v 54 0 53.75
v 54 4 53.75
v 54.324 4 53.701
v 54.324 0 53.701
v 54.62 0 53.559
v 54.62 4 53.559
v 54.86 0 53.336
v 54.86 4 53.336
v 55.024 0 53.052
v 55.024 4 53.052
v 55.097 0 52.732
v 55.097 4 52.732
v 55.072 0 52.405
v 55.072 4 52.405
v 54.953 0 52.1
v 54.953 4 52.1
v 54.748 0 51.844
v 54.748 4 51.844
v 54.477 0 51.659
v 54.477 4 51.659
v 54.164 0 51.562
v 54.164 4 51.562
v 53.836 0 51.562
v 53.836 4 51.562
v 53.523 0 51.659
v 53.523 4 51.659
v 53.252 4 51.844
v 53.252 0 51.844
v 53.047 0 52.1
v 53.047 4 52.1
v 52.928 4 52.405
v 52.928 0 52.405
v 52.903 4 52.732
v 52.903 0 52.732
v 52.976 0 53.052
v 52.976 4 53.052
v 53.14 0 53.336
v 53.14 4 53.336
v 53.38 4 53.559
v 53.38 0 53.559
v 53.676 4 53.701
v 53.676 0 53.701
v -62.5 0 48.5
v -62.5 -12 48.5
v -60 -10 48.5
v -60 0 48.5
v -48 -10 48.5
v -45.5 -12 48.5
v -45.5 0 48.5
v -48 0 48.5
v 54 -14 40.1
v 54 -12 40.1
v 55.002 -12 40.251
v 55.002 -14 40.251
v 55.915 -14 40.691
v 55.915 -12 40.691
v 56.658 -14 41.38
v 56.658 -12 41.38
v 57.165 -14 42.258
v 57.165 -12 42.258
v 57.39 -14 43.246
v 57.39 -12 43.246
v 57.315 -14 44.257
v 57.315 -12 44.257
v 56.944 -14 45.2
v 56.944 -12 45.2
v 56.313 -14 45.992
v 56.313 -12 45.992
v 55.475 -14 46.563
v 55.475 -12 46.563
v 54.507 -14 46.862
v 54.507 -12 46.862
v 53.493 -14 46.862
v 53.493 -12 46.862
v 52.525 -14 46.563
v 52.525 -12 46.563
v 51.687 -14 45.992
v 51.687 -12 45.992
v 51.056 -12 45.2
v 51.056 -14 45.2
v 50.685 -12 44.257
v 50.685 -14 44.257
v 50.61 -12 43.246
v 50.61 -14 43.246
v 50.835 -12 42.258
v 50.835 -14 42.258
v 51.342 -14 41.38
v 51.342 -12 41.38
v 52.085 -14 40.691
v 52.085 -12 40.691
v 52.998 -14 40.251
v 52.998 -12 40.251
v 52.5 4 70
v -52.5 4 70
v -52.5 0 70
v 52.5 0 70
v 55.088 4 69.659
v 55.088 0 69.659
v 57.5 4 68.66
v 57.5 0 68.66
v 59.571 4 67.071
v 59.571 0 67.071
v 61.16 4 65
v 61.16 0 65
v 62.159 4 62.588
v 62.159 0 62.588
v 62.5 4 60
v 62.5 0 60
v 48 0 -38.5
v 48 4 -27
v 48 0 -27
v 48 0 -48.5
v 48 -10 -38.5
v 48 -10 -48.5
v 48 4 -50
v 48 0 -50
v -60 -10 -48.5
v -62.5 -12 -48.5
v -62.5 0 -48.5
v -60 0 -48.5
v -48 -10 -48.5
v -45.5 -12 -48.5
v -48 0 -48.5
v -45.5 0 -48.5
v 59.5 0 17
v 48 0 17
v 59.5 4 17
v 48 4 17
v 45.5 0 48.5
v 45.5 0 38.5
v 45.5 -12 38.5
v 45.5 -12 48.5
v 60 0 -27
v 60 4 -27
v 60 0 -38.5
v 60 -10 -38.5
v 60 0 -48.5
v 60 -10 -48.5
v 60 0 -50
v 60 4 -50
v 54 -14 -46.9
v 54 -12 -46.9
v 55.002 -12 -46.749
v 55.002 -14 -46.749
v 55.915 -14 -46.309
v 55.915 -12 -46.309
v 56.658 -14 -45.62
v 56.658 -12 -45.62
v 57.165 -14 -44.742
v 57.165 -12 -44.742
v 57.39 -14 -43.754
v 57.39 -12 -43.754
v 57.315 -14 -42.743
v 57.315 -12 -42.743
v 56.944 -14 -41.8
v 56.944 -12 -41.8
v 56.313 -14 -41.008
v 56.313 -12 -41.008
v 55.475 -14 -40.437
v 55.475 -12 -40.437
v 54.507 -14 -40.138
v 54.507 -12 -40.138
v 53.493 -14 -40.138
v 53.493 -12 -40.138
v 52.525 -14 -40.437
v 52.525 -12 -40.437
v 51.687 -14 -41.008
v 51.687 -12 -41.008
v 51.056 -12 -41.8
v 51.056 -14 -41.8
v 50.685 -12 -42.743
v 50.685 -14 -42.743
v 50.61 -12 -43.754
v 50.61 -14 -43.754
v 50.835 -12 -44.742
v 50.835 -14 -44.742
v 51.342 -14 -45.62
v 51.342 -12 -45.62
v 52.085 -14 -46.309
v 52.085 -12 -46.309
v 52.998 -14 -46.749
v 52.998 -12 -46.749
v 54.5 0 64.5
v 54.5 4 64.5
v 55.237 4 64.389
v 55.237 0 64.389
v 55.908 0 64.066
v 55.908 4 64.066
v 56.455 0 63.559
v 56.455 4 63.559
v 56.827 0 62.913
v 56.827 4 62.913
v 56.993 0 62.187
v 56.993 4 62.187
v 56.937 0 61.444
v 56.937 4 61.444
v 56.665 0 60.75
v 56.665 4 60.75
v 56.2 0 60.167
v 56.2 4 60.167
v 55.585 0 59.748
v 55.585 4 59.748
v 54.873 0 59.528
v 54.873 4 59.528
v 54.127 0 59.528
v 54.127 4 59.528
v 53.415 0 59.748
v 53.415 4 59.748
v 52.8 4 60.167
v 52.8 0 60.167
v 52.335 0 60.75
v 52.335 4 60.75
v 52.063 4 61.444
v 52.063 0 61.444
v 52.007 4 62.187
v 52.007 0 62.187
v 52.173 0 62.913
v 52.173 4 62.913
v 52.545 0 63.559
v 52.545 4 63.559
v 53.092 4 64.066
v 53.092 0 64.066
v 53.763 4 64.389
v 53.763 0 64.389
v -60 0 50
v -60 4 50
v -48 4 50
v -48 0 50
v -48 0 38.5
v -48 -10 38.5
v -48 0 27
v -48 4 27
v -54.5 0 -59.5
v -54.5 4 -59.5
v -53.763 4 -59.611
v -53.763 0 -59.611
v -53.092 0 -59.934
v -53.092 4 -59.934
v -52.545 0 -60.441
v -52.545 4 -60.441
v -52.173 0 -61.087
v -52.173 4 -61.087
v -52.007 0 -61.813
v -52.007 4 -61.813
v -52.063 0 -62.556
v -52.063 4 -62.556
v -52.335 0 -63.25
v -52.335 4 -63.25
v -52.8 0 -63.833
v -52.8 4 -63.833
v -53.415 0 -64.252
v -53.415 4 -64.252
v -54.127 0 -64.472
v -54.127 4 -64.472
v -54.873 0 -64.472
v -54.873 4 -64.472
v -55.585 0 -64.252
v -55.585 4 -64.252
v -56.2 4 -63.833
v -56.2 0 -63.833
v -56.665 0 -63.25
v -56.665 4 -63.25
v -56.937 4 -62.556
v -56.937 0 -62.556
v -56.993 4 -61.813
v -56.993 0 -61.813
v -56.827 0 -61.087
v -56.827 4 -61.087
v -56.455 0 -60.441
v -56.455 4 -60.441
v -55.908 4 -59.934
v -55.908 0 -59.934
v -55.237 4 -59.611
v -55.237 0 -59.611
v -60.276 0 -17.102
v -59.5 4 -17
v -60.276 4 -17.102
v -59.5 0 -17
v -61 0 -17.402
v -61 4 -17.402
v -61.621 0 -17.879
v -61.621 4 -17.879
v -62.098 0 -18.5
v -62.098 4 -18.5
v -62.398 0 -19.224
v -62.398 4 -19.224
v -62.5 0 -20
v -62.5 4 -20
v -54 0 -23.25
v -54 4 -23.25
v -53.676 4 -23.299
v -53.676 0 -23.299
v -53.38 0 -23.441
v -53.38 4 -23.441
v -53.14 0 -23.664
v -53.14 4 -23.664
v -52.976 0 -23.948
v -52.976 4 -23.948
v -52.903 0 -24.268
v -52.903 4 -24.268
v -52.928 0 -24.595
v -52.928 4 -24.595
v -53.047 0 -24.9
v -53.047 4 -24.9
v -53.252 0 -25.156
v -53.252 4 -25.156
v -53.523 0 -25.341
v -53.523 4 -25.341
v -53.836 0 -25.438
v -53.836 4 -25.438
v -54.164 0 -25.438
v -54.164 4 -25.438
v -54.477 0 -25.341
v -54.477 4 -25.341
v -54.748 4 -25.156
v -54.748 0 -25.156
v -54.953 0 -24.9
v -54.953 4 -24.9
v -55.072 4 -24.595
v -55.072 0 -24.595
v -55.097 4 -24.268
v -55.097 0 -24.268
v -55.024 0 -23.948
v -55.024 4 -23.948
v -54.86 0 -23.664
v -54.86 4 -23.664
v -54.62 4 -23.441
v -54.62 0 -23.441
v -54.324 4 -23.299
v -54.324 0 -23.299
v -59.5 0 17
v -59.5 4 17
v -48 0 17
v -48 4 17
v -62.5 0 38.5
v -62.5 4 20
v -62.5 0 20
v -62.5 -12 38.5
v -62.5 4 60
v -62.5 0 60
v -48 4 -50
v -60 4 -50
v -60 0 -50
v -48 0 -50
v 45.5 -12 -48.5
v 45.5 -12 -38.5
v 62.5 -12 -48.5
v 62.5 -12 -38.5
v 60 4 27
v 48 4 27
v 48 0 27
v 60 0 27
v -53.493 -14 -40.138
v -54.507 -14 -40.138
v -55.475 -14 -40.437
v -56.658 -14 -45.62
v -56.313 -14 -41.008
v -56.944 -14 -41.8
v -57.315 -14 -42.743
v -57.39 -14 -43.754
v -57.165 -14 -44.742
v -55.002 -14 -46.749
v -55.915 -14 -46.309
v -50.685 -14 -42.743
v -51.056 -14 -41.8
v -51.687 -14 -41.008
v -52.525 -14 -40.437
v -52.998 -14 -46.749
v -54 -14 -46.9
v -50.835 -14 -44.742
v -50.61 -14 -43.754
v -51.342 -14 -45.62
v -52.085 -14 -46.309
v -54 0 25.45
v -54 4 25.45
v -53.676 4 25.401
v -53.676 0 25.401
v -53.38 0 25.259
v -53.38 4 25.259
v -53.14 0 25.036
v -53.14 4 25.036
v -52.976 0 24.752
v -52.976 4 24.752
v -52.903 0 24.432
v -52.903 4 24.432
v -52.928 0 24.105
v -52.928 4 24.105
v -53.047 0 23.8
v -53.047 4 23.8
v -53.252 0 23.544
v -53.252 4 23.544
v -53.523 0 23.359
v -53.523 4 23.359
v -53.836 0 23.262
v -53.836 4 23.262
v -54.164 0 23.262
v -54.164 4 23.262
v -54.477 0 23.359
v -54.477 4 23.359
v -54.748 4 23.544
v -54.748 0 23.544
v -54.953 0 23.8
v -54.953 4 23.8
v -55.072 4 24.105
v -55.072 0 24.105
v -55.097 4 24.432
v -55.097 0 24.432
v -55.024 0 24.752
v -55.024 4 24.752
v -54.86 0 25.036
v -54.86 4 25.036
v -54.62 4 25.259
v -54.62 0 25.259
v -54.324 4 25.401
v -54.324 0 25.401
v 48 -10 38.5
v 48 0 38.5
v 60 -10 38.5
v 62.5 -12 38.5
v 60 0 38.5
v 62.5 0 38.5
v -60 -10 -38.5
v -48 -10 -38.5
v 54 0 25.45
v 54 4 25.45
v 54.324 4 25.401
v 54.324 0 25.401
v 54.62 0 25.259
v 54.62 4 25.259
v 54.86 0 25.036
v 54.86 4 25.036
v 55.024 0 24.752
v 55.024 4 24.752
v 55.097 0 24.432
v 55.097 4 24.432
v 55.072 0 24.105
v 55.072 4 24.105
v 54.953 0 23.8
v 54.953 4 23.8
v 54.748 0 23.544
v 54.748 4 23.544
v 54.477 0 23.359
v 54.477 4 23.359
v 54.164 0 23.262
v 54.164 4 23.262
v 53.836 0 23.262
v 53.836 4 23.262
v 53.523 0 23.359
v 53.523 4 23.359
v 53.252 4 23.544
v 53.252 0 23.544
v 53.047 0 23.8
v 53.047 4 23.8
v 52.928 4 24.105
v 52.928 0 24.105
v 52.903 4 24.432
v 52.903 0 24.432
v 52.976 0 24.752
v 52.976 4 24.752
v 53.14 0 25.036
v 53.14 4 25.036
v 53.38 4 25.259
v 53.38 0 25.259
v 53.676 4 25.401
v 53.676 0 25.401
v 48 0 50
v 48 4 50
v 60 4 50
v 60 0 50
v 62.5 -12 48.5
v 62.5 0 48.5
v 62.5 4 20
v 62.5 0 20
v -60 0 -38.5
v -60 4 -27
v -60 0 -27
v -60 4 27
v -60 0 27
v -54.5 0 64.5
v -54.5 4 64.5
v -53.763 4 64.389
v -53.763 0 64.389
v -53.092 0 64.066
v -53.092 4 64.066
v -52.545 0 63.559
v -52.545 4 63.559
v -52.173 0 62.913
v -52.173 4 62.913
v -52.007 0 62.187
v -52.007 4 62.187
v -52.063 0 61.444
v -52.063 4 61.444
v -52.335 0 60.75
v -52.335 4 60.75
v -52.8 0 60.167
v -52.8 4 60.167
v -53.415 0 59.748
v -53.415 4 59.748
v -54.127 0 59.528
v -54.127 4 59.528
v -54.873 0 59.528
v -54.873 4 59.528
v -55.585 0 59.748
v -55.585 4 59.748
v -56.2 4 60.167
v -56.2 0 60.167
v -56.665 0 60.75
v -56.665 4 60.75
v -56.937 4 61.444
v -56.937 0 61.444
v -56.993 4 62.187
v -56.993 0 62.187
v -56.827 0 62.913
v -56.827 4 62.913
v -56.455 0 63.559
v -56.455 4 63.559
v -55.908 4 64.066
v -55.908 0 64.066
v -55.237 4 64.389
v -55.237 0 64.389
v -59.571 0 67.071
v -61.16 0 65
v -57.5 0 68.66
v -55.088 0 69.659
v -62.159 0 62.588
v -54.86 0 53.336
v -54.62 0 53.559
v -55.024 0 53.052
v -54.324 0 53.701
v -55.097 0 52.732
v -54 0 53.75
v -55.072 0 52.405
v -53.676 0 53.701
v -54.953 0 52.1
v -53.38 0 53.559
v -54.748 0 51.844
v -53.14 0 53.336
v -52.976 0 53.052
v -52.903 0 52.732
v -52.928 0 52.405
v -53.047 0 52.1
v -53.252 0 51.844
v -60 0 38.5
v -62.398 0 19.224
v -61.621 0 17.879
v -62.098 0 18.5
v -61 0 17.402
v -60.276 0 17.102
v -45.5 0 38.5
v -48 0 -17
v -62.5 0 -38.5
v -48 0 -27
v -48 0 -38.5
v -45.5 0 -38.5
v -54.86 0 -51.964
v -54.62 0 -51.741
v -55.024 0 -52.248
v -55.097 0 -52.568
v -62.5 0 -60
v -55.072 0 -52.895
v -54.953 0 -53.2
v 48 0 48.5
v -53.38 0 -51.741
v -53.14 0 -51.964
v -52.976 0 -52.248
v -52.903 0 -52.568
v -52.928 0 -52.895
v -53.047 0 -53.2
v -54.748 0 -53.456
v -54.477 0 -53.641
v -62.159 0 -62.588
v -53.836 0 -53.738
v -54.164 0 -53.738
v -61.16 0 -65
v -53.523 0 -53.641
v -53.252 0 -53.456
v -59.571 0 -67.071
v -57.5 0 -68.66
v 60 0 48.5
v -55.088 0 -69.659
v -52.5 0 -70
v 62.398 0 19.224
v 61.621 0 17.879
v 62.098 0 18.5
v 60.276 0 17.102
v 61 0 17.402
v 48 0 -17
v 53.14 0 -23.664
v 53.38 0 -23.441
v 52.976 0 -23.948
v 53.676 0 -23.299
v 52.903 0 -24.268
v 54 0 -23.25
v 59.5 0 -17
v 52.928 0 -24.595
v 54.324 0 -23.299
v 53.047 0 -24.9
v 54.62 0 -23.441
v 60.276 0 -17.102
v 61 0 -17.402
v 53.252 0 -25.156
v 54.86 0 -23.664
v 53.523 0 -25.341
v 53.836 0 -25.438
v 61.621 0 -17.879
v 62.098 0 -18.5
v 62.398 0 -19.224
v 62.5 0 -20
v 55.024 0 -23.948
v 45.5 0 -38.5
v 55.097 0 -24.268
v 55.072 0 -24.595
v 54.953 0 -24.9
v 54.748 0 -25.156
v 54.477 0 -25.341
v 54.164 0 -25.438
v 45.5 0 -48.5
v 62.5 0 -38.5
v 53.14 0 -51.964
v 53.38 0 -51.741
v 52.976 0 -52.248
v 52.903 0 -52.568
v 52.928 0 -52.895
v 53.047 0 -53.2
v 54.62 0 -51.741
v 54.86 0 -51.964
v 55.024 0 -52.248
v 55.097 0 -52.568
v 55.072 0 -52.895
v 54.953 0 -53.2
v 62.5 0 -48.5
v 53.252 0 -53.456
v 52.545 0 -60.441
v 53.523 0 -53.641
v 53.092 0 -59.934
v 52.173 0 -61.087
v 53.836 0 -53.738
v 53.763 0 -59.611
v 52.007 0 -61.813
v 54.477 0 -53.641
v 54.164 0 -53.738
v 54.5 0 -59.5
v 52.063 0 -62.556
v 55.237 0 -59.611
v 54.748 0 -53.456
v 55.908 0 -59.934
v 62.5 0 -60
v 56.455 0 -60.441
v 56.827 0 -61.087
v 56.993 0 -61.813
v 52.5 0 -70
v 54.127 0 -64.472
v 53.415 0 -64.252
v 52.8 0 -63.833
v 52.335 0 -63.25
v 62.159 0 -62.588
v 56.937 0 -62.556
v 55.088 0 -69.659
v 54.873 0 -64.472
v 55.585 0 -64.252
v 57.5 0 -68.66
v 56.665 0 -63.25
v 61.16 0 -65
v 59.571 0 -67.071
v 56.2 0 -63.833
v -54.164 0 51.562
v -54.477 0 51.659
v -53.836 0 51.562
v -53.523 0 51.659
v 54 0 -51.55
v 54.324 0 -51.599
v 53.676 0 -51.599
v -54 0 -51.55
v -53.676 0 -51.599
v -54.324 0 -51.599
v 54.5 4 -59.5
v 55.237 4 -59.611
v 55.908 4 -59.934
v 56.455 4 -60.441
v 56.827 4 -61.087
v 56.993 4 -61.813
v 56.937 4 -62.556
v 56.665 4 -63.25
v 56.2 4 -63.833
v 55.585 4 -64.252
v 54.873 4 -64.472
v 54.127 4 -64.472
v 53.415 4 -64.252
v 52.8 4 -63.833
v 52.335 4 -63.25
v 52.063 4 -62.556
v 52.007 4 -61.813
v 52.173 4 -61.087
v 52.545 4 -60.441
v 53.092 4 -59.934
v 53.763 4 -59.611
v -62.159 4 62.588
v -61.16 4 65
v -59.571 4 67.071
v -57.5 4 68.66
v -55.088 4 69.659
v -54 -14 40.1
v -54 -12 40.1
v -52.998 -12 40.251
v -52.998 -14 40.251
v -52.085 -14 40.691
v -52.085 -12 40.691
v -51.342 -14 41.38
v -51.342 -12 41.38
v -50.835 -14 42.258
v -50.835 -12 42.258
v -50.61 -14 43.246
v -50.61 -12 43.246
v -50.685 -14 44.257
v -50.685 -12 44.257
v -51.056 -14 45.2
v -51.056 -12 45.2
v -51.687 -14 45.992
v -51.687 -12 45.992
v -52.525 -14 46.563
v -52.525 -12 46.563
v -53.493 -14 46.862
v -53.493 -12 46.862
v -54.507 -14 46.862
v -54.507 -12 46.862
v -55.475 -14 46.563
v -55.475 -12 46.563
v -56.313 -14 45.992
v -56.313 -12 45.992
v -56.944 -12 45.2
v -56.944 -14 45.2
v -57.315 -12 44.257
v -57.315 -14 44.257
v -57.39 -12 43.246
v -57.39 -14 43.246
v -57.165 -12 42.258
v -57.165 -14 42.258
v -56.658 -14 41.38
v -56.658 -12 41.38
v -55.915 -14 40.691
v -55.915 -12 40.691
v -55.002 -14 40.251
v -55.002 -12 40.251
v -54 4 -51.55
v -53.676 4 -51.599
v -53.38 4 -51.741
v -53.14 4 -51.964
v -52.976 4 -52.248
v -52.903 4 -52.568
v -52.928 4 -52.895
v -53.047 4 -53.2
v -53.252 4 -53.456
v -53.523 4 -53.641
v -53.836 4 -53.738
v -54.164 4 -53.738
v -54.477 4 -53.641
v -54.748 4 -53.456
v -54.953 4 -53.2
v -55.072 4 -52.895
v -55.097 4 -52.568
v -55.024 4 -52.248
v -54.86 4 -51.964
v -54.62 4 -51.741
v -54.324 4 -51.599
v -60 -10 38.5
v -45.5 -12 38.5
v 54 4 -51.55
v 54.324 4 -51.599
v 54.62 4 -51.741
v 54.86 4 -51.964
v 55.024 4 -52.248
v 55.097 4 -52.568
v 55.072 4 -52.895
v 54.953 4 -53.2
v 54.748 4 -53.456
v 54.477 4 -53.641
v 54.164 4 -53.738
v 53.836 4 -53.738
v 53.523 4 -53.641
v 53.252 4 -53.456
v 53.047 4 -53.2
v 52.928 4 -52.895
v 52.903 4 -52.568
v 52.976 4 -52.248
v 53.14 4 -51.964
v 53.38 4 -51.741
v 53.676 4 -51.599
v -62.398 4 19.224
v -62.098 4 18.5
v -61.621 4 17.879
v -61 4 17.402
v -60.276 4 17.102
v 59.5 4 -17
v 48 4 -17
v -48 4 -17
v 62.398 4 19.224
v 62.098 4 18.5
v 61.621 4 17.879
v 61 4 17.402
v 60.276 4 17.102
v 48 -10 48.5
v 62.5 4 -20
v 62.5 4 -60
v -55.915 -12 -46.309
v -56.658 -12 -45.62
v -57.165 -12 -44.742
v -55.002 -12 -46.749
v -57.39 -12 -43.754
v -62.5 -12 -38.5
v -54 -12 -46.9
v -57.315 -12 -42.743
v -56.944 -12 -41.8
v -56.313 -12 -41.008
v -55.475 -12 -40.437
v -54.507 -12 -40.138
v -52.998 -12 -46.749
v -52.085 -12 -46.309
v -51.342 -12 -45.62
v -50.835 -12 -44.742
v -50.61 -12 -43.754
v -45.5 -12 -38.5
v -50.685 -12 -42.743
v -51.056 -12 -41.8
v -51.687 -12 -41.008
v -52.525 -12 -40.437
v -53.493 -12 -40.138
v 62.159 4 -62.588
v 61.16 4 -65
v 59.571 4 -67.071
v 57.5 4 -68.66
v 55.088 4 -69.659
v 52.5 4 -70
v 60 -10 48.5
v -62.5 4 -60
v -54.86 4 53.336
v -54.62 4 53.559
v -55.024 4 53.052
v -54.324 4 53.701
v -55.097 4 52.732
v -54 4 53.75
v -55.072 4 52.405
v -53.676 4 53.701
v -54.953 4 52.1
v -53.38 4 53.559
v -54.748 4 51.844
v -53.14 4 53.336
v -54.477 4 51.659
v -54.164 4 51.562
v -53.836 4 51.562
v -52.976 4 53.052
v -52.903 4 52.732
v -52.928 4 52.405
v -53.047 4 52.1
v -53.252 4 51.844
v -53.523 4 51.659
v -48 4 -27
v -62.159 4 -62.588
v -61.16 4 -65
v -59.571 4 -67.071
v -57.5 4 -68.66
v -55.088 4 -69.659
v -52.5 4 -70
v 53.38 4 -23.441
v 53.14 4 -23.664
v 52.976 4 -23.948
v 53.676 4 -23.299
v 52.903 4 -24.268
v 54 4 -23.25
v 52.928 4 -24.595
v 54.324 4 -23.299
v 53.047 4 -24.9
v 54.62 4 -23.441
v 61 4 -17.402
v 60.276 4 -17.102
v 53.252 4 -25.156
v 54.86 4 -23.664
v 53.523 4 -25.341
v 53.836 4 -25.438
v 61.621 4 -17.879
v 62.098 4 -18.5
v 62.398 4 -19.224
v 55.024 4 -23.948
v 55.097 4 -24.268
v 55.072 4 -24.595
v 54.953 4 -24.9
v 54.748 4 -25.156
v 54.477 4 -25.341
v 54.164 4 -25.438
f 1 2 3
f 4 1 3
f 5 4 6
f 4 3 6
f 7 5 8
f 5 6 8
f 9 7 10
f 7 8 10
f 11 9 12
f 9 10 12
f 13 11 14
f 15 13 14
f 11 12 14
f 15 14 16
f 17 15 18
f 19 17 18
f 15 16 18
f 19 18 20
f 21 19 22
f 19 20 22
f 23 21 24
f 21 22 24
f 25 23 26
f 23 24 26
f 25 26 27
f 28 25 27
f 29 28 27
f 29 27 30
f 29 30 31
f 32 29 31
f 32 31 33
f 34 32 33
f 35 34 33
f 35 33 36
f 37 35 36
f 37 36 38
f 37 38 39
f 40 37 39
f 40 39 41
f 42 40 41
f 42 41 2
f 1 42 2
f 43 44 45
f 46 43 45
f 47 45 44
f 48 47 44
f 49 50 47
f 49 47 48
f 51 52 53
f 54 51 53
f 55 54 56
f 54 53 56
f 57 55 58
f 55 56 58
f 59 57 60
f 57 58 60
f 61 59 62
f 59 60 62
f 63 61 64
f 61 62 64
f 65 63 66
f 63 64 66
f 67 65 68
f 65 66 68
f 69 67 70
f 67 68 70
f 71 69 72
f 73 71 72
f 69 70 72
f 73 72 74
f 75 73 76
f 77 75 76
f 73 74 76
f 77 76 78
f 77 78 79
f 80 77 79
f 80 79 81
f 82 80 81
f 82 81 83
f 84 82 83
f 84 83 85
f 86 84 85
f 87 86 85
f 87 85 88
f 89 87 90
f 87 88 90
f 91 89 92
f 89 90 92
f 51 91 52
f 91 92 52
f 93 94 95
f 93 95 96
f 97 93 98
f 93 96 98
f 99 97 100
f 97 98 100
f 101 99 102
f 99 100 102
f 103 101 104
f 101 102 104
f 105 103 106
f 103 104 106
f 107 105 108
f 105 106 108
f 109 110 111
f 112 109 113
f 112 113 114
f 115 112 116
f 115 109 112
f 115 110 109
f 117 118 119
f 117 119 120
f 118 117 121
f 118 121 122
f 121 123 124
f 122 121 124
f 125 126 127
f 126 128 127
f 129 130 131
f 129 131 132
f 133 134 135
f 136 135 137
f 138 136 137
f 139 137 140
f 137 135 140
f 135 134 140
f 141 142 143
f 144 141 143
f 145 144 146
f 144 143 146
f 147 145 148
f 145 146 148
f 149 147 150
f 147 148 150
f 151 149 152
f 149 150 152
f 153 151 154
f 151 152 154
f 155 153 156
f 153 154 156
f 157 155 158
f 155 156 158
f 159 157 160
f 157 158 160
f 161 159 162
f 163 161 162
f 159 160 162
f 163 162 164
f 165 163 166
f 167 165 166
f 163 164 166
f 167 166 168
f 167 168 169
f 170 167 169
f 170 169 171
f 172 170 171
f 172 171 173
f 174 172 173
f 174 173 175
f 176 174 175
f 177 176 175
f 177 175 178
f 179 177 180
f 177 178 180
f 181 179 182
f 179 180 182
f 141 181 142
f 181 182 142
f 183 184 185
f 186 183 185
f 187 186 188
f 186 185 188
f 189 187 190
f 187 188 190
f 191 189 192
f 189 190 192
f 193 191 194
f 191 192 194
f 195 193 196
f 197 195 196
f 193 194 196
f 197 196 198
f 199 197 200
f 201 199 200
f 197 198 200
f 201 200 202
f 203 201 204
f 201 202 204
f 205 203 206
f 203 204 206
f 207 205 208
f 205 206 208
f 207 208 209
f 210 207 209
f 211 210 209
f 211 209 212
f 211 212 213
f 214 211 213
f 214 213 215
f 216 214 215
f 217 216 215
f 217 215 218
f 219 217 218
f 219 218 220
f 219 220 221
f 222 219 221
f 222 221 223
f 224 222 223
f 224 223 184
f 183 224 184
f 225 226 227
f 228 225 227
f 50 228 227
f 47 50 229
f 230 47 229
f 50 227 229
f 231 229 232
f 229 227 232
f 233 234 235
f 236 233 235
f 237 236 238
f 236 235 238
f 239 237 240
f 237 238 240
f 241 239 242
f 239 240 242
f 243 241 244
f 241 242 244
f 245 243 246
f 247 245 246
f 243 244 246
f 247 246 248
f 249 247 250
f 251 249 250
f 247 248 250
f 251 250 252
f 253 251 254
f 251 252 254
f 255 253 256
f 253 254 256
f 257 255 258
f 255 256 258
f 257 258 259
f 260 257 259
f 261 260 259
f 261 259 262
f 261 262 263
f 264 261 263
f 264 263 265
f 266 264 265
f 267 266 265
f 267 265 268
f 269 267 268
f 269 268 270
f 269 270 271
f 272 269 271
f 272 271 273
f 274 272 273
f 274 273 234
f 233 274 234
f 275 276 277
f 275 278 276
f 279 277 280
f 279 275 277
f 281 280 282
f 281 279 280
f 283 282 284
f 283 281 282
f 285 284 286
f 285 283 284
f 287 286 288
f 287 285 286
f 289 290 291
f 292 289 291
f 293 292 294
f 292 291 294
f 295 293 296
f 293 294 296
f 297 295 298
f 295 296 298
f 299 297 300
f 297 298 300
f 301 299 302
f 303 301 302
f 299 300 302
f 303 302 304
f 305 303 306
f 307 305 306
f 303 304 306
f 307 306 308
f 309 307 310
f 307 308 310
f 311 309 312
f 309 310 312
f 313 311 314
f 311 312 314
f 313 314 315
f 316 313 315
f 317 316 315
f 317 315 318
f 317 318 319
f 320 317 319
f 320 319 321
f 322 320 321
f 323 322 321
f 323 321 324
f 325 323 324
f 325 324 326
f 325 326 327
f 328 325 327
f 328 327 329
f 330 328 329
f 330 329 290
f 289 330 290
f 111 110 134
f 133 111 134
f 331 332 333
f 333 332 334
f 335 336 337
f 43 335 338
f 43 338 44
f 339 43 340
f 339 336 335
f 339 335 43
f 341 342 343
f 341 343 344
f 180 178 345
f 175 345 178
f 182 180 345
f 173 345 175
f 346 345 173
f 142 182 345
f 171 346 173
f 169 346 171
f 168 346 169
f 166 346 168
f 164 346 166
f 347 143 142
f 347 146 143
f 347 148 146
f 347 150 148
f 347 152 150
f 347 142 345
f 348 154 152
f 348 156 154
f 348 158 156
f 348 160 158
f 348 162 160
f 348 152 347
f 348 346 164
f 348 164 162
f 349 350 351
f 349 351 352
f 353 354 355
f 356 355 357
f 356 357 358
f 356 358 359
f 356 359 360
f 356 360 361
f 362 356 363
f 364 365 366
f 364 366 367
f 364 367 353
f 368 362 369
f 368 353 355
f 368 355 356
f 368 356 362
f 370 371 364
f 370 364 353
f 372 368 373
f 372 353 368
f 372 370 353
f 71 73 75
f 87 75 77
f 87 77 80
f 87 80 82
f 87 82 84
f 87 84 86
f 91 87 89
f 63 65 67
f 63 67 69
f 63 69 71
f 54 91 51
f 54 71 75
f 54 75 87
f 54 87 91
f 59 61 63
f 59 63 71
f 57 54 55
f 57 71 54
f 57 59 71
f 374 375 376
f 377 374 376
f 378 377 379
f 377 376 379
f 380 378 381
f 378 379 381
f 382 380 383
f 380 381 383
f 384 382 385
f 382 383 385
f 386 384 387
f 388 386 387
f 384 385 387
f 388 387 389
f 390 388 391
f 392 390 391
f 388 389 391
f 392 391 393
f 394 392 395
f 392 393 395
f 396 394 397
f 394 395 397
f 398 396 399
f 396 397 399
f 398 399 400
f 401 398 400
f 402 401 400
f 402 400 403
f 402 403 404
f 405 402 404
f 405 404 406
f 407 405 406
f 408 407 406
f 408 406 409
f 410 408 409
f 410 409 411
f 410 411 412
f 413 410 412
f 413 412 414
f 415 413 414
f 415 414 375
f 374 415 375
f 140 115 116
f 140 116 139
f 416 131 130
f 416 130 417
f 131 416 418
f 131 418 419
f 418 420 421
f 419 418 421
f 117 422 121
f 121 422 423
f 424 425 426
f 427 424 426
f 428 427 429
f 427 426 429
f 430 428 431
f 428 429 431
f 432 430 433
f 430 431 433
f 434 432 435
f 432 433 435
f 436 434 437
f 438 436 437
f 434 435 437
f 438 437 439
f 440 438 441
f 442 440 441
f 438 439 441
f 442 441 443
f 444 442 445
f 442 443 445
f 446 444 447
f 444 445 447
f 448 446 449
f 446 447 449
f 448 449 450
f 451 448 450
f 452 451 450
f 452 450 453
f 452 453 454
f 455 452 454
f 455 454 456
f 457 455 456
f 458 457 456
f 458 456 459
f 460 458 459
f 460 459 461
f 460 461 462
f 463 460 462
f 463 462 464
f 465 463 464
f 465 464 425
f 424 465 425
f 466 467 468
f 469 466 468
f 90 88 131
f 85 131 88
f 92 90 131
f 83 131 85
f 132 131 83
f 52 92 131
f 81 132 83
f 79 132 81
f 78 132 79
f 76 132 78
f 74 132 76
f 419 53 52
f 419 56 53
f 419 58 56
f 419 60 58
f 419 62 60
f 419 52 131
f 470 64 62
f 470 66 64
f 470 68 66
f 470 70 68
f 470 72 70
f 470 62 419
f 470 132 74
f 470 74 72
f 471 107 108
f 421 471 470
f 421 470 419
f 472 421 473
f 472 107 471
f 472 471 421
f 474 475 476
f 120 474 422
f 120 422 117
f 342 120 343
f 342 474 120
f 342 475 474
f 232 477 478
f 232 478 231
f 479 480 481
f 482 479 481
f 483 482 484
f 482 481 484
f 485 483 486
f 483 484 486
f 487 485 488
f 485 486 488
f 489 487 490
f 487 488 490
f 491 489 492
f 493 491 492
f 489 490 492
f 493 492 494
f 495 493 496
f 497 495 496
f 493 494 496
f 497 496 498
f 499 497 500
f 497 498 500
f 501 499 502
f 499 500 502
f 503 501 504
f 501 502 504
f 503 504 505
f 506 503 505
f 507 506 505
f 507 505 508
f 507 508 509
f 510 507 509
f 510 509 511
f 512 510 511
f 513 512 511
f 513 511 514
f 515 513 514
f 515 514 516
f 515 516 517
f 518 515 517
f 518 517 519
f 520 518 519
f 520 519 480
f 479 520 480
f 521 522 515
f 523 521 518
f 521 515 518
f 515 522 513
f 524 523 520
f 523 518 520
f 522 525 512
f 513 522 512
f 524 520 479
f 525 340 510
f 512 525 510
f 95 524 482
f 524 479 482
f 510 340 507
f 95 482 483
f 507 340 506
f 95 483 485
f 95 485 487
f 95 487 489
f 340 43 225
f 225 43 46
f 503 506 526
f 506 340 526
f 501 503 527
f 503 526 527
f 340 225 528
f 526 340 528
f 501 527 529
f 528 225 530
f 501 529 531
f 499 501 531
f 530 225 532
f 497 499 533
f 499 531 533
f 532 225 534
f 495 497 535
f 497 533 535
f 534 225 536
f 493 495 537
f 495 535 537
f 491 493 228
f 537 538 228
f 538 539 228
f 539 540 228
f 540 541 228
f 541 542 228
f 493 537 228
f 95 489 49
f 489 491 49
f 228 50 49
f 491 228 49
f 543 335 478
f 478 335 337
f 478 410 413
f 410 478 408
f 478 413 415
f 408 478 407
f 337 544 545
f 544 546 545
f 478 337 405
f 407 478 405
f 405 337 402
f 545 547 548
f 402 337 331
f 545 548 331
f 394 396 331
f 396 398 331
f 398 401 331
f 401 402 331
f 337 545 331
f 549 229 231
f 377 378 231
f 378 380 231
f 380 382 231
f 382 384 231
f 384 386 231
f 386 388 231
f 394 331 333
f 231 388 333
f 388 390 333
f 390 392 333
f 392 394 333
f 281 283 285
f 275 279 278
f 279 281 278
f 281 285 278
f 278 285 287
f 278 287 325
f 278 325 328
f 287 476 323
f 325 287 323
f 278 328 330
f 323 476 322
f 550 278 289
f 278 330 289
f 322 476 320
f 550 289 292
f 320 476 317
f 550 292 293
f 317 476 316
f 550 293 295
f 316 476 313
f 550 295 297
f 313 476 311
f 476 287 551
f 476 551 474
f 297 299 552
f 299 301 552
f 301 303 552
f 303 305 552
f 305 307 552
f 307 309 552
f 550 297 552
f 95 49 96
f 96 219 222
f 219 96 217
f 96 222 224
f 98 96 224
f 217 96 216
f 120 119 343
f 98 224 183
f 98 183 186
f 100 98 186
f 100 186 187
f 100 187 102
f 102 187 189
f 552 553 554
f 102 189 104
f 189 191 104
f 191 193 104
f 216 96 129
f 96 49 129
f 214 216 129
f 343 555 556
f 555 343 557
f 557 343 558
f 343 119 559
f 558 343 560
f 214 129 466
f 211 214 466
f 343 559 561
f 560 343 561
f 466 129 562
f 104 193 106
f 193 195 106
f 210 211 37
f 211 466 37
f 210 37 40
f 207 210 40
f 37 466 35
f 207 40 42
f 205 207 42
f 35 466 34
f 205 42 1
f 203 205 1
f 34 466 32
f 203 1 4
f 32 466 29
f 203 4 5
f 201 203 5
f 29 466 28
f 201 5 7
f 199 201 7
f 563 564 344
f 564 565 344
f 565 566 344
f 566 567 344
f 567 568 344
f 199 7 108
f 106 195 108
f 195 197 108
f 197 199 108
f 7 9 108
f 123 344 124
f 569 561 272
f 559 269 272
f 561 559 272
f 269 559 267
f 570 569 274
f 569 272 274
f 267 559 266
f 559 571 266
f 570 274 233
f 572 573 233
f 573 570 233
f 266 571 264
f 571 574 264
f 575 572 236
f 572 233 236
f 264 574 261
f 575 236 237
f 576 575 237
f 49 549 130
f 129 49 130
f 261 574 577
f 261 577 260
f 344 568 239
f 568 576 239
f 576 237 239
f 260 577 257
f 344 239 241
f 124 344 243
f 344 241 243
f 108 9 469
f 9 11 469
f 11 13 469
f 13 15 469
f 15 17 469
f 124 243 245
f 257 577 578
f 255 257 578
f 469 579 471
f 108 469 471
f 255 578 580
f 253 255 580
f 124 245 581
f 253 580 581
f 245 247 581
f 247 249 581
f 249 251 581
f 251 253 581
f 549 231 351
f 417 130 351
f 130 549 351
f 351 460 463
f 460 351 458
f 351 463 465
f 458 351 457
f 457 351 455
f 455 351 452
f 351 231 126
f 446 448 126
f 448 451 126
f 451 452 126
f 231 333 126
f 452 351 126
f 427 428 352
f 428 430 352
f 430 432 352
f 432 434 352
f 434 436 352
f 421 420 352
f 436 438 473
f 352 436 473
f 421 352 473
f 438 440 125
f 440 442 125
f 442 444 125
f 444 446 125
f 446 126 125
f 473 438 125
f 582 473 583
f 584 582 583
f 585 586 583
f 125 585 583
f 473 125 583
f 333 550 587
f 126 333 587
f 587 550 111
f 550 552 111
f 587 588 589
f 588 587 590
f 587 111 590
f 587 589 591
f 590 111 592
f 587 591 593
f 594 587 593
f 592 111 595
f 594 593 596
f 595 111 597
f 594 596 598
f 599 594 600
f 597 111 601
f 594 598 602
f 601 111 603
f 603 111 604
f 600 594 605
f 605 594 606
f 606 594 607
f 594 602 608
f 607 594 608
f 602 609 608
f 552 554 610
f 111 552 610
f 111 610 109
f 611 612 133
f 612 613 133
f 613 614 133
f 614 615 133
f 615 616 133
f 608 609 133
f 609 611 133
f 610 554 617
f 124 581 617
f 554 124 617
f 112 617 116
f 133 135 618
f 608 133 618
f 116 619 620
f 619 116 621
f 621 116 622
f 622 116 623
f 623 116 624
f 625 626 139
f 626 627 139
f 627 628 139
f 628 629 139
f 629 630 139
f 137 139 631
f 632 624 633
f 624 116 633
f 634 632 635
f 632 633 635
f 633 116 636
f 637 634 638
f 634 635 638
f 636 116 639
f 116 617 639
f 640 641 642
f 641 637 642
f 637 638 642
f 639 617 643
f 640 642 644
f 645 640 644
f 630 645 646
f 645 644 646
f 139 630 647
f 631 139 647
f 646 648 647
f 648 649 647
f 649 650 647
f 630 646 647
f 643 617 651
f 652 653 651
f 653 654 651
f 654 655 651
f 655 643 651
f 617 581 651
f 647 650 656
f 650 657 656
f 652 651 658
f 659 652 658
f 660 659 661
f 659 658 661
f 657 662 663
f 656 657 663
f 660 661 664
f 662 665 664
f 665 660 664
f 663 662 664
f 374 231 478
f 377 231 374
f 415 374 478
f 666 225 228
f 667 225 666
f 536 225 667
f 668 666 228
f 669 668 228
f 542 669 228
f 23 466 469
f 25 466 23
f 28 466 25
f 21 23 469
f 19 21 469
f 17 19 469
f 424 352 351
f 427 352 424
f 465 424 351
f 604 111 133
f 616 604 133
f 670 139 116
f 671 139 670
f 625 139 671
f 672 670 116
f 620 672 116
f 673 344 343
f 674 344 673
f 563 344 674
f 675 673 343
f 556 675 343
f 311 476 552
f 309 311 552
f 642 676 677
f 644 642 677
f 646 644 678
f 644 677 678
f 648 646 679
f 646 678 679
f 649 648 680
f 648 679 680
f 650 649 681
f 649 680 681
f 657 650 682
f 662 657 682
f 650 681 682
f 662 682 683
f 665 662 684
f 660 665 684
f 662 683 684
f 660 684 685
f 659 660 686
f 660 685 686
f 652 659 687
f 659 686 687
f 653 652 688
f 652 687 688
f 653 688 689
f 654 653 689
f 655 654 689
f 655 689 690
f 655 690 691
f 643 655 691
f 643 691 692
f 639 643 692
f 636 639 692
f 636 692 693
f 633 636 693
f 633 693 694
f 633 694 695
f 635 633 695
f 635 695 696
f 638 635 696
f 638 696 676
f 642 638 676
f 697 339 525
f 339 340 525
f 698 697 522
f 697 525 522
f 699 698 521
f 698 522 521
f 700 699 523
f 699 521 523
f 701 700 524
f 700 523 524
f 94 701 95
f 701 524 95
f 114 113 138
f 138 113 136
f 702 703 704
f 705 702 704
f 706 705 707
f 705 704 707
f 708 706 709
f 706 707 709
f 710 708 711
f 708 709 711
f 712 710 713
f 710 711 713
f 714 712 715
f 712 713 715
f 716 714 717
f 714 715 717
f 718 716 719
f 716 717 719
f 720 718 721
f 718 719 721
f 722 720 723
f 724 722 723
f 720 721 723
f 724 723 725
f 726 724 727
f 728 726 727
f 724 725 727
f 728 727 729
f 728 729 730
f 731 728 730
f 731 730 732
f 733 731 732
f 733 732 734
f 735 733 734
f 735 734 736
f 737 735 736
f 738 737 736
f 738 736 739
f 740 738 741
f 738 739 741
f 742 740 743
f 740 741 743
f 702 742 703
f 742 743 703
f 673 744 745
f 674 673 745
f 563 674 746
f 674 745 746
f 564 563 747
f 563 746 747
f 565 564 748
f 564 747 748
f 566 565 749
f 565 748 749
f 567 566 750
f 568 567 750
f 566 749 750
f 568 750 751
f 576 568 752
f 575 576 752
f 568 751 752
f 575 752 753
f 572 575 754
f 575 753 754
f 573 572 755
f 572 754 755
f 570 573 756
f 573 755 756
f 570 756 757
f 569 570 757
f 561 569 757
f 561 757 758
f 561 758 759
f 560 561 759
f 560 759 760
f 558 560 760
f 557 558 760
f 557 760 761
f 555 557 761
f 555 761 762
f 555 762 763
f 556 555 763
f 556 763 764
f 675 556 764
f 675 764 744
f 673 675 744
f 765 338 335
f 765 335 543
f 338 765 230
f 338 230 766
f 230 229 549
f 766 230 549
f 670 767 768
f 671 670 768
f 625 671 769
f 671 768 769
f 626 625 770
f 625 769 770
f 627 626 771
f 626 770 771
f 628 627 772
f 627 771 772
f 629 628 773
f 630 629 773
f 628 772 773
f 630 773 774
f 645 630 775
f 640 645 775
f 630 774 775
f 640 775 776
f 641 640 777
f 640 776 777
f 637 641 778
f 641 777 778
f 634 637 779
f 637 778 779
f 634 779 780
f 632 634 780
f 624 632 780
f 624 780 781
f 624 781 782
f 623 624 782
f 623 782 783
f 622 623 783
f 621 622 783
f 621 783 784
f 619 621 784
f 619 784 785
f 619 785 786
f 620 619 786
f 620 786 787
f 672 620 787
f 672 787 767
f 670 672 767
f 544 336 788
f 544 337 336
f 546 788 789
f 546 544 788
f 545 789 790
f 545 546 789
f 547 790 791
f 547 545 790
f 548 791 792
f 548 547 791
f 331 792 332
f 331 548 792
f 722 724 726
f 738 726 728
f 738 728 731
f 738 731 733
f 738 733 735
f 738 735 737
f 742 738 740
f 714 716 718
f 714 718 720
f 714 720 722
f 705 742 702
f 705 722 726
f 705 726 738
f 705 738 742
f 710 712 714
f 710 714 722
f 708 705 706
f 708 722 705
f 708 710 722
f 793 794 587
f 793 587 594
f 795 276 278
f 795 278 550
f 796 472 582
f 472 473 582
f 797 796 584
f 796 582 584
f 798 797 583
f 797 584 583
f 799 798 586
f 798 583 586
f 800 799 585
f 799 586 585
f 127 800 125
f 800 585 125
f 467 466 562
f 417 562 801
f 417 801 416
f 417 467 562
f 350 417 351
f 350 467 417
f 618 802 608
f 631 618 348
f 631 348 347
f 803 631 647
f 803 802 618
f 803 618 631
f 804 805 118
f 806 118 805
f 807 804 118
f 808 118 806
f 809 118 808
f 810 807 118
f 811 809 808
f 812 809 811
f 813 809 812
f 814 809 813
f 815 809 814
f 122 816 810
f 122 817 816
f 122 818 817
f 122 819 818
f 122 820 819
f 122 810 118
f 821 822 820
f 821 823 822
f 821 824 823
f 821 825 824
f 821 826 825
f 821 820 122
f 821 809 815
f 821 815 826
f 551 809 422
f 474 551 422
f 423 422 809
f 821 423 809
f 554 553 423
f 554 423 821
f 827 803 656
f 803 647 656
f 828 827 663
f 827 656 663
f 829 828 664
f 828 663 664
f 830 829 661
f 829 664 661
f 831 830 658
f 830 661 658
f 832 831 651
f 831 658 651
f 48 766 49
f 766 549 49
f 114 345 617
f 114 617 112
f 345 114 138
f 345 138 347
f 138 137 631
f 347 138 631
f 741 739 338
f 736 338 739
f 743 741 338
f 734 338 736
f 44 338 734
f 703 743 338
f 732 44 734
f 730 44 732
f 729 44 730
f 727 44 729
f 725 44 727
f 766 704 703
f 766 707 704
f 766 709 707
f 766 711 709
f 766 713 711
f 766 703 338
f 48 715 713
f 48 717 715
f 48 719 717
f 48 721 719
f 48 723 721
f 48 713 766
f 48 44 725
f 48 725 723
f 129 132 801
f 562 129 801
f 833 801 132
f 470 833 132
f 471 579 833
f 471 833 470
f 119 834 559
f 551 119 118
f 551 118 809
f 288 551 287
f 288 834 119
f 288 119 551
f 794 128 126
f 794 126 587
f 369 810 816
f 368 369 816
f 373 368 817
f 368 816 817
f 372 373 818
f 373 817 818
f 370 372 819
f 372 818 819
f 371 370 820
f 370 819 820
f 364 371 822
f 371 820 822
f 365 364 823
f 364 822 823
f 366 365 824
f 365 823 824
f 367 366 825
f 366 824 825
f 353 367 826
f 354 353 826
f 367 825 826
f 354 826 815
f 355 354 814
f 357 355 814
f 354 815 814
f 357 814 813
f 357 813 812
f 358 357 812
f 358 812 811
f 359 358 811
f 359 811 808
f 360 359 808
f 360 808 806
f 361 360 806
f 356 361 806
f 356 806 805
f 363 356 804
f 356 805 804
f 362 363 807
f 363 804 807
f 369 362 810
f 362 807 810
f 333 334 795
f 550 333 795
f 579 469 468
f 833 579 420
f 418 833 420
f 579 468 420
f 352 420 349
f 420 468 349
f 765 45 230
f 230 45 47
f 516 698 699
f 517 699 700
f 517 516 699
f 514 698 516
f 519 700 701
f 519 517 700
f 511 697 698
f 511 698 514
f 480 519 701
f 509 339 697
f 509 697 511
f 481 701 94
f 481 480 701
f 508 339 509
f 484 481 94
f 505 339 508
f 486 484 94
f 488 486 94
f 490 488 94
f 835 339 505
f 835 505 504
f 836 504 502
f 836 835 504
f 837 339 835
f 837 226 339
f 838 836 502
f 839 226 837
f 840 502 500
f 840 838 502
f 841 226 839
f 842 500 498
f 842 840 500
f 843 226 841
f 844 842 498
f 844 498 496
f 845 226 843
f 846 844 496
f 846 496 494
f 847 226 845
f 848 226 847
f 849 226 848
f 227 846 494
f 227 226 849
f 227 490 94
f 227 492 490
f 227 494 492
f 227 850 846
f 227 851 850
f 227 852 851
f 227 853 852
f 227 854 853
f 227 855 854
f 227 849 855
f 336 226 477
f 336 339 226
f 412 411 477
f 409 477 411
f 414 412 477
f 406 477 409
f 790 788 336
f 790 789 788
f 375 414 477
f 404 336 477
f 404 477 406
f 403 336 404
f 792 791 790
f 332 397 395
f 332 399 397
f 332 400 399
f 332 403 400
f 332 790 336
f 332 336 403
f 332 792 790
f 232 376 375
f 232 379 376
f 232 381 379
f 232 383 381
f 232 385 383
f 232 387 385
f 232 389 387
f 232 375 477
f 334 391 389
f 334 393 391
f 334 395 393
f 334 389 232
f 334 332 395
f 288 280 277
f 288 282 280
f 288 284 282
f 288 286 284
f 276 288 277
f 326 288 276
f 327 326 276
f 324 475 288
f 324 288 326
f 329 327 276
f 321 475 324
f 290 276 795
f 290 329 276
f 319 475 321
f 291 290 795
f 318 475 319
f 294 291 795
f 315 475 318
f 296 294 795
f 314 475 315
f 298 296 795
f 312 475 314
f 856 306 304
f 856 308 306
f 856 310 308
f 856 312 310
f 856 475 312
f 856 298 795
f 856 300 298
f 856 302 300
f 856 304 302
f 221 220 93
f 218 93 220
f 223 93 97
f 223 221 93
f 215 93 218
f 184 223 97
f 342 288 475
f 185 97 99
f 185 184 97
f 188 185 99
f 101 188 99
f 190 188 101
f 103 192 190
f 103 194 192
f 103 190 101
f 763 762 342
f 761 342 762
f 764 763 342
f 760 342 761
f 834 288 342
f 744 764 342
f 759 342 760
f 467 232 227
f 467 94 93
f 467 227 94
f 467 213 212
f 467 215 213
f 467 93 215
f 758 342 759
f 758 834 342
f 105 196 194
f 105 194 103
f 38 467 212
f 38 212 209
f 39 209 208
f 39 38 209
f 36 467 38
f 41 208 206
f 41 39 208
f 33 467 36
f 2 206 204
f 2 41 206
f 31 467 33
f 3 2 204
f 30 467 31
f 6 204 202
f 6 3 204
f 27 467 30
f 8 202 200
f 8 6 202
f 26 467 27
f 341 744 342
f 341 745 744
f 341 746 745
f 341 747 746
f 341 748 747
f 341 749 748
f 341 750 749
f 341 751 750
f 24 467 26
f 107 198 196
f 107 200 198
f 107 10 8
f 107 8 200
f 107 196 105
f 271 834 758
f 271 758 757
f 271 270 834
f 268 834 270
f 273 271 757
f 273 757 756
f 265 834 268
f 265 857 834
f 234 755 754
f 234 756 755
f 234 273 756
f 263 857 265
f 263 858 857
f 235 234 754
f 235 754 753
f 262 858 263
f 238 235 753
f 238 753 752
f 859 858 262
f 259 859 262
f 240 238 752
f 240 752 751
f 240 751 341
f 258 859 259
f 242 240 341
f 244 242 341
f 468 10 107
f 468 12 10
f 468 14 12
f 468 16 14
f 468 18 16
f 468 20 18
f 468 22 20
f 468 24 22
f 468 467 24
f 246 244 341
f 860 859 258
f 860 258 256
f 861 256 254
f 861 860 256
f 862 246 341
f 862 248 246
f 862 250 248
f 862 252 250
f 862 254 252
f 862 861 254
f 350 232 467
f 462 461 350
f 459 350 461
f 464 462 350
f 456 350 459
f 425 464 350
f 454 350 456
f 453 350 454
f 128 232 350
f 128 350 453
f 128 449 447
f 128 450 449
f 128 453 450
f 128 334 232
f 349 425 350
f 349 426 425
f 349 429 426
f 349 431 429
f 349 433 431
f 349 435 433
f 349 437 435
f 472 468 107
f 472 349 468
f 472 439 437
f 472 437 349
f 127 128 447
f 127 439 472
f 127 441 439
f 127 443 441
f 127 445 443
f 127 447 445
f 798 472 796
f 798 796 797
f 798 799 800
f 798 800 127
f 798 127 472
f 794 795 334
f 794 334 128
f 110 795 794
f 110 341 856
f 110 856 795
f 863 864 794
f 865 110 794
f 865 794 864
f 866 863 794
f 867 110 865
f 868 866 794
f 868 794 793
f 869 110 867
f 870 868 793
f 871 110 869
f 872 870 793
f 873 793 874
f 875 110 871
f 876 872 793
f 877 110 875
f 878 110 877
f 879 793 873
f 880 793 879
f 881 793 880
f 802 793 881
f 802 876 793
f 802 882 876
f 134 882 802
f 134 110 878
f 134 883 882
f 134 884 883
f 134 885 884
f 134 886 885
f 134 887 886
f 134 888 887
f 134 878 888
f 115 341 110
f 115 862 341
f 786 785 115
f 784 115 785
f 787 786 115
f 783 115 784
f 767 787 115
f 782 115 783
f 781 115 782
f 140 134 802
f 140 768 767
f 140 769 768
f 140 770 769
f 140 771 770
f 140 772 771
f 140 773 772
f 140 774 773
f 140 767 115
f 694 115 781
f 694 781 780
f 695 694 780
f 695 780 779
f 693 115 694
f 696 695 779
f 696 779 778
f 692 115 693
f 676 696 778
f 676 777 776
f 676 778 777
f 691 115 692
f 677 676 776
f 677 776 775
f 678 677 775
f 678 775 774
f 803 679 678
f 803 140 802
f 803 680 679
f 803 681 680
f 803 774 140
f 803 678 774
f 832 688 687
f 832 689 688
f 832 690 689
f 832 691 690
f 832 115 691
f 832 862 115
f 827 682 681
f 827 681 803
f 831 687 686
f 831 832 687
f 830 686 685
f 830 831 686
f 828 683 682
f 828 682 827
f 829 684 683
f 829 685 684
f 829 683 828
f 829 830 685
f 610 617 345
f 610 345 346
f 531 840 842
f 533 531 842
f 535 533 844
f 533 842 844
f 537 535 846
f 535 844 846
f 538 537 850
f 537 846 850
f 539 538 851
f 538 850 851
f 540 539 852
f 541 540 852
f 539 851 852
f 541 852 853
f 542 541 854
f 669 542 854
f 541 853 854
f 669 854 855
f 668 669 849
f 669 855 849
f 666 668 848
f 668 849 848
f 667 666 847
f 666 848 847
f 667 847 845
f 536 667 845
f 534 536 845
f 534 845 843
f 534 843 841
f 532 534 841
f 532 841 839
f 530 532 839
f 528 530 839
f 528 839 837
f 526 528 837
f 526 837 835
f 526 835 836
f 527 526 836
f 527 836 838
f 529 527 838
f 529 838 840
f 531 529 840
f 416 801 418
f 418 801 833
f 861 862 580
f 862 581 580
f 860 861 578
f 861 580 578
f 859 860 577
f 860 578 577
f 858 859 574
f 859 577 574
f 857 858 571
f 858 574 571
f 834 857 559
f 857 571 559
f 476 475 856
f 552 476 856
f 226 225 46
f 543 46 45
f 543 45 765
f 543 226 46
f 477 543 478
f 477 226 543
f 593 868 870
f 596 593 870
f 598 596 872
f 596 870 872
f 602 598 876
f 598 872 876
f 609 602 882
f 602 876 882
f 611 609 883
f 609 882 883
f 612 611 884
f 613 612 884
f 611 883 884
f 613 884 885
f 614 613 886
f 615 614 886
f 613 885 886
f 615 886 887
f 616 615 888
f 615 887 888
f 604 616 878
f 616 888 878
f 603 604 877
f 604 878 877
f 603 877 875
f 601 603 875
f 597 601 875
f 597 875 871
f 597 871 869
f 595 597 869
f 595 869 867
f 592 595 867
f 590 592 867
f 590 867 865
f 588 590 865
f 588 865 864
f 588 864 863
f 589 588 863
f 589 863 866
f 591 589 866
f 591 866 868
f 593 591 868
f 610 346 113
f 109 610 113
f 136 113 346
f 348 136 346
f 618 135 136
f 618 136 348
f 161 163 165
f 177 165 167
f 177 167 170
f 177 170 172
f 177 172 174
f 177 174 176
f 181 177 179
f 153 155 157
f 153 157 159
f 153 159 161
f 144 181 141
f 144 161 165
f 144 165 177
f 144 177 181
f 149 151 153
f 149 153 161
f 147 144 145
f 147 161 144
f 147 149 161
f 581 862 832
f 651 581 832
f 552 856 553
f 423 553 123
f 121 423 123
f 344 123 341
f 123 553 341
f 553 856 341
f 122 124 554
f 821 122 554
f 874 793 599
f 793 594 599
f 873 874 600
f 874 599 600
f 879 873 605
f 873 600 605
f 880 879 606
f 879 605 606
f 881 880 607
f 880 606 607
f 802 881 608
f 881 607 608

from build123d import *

# Parameters (mm, degrees)
SKETCH1_W           = 120
SKETCH1_H           = 140
BOSS_EXTRUDE1_DEPTH = 4
SKETCH2_W           = 12
SKETCH2_H           = 23
SKETCH2_H_2         = 34
SKETCH2_R           = 1.1
SKETCH2_R_2         = 2.5
CUT_EXTRUDE1_DEPTH  = 93.28217596
SKETCH3_W           = 2.5
SKETCH3_H           = 140
BOSS_EXTRUDE2_DEPTH = 4
SKETCH7_W           = 2.5
SKETCH7_H           = 10
BOSS_EXTRUDE6_DEPTH = 10
SKETCH8_W           = 17
SKETCH8_H           = 10
BOSS_EXTRUDE7_DEPTH = 2
SKETCH9_R           = 3.4
BOSS_EXTRUDE8_DEPTH = 2
SKETCH10_W          = 2.5
SKETCH10_H          = 34
CUT_EXTRUDE2_DEPTH  = 96.552341677
FILLET1_R           = 10
FILLET2_R           = 10
FILLET3_R           = 10
FILLET4_R           = 10
FILLET5_R           = 3
FILLET6_R           = 3
FILLET7_R           = 3
FILLET8_R           = 3


with BuildPart() as part:
    # Sketch1 → Boss-Extrude1 (new body)
    with BuildSketch(Plane(origin=(0, 0, 0), x_dir=(1, 0, 0), z_dir=(0, 1, 0))):
        Rectangle(SKETCH1_W, SKETCH1_H)
    extrude(amount=BOSS_EXTRUDE1_DEPTH)

    # Sketch2 → Cut-Extrude1 (cut, through all)
    with BuildSketch(Plane(origin=(0, 4, 0), x_dir=(1, 0, 0), z_dir=(0, 1, 0))):
        with Locations((54, 38.5)):
            Rectangle(SKETCH2_W, SKETCH2_H)
        with Locations((-54, 38.5)):
            Rectangle(SKETCH2_W, SKETCH2_H)
        with Locations((54, -38.5)):
            Rectangle(SKETCH2_W, SKETCH2_H)
        with Locations((-54, -38.5)):
            Rectangle(SKETCH2_W, SKETCH2_H)
        with Locations((-54, 0)):
            Rectangle(SKETCH2_W, SKETCH2_H_2)
        with Locations((54, 0)):
            Rectangle(SKETCH2_W, SKETCH2_H_2)
        with Locations(Location((-54, 52.65, 0), (0, 0, 270))):
            Circle(SKETCH2_R)
        with Locations(Location((-54, 24.35, 0), (0, 0, 270))):
            Circle(SKETCH2_R)
        with Locations(Location((-54, -24.35, 0), (0, 0, 270))):
            Circle(SKETCH2_R)
        with Locations(Location((-54, -52.65, 0), (0, 0, 270))):
            Circle(SKETCH2_R)
        with Locations(Location((54, 52.65, 0), (0, 0, 270))):
            Circle(SKETCH2_R)
        with Locations(Location((54, 24.35, 0), (0, 0, 270))):
            Circle(SKETCH2_R)
        with Locations(Location((54, -24.35, 0), (0, 0, 270))):
            Circle(SKETCH2_R)
        with Locations(Location((54, -52.65, 0), (0, 0, 270))):
            Circle(SKETCH2_R)
        with Locations(Location((-54.5, 62, 0), (0, 0, 270))):
            Circle(SKETCH2_R_2)
        with Locations(Location((54.5, 62, 0), (0, 0, 270))):
            Circle(SKETCH2_R_2)
        with Locations(Location((54.5, -62, 0), (0, 0, 270))):
            Circle(SKETCH2_R_2)
        with Locations(Location((-54.5, -62, 0), (0, 0, 270))):
            Circle(SKETCH2_R_2)
    extrude(amount=-CUT_EXTRUDE1_DEPTH, mode=Mode.SUBTRACT)

    # Sketch3 → Boss-Extrude2 (add)
    with BuildSketch(Plane(origin=(0, 4, 0), x_dir=(1, 0, 0), z_dir=(0, 1, 0))):
        with Locations((61.25, 0)):
            Rectangle(SKETCH3_W, SKETCH3_H)
        with Locations((-61.25, 0)):
            Rectangle(SKETCH3_W, SKETCH3_H)
    extrude(amount=-BOSS_EXTRUDE2_DEPTH)

    # Sketch7 → Boss-Extrude6 (add)
    with BuildSketch(Plane.XZ):
        with Locations((46.75, 43.5)):
            Rectangle(SKETCH7_W, SKETCH7_H)
        with Locations((61.25, 43.5)):
            Rectangle(SKETCH7_W, SKETCH7_H)
        with Locations((-61.25, 43.5)):
            Rectangle(SKETCH7_W, SKETCH7_H)
        with Locations((-46.75, 43.5)):
            Rectangle(SKETCH7_W, SKETCH7_H)
        with Locations((-61.25, -43.5)):
            Rectangle(SKETCH7_W, SKETCH7_H)
        with Locations((-46.75, -43.5)):
            Rectangle(SKETCH7_W, SKETCH7_H)
        with Locations((46.75, -43.5)):
            Rectangle(SKETCH7_W, SKETCH7_H)
        with Locations((61.25, -43.5)):
            Rectangle(SKETCH7_W, SKETCH7_H)
    extrude(amount=BOSS_EXTRUDE6_DEPTH)

    # Sketch8 → Boss-Extrude7 (add)
    with BuildSketch(Plane.XZ.offset(10)):
        with Locations((-54, 43.5)):
            Rectangle(SKETCH8_W, SKETCH8_H)
        with Locations((-54, -43.5)):
            Rectangle(SKETCH8_W, SKETCH8_H)
        with Locations((54, -43.5)):
            Rectangle(SKETCH8_W, SKETCH8_H)
        with Locations((54, 43.5)):
            Rectangle(SKETCH8_W, SKETCH8_H)
    extrude(amount=BOSS_EXTRUDE7_DEPTH)

    # Sketch9 → Boss-Extrude8 (add)
    with BuildSketch(Plane.XZ.offset(12)):
        with Locations(Location((54, 43.5, 0), (0, 0, 270))):
            Circle(SKETCH9_R)
        with Locations(Location((-54, 43.5, 0), (0, 0, 270))):
            Circle(SKETCH9_R)
        with Locations(Location((-54, -43.5, 0), (0, 0, 270))):
            Circle(SKETCH9_R)
        with Locations(Location((54, -43.5, 0), (0, 0, 270))):
            Circle(SKETCH9_R)
    extrude(amount=BOSS_EXTRUDE8_DEPTH)

    # Sketch10 → Cut-Extrude2 (cut, through all)
    with BuildSketch(Plane(origin=(0, 4, 0), x_dir=(1, 0, 0), z_dir=(0, 1, 0))):
        with Locations((61.25, 0)):
            Rectangle(SKETCH10_W, SKETCH10_H)
        with Locations((-61.25, 0)):
            Rectangle(SKETCH10_W, SKETCH10_H)
    extrude(amount=-CUT_EXTRUDE2_DEPTH, mode=Mode.SUBTRACT)

    # Fillet1
    fillet1_edges = [part.edges().sort_by_distance(p)[0] for p in [
        (62.5, 2, -70),
    ]]
    fillet(fillet1_edges, radius=FILLET1_R)

    # Fillet2
    fillet2_edges = [part.edges().sort_by_distance(p)[0] for p in [
        (-62.5, 2, -70),
    ]]
    fillet(fillet2_edges, radius=FILLET2_R)

    # Fillet3
    fillet3_edges = [part.edges().sort_by_distance(p)[0] for p in [
        (-62.5, 2, 70),
    ]]
    fillet(fillet3_edges, radius=FILLET3_R)

    # Fillet4
    fillet4_edges = [part.edges().sort_by_distance(p)[0] for p in [
        (62.5, 2, 70),
    ]]
    fillet(fillet4_edges, radius=FILLET4_R)

    # Fillet5
    fillet5_edges = [part.edges().sort_by_distance(p)[0] for p in [
        (62.5, 2, -17),
    ]]
    fillet(fillet5_edges, radius=FILLET5_R)

    # Fillet6
    fillet6_edges = [part.edges().sort_by_distance(p)[0] for p in [
        (-62.5, 2, 17),
    ]]
    fillet(fillet6_edges, radius=FILLET6_R)

    # Fillet7
    fillet7_edges = [part.edges().sort_by_distance(p)[0] for p in [
        (62.5, 2, 17),
    ]]
    fillet(fillet7_edges, radius=FILLET7_R)

    # Fillet8
    fillet8_edges = [part.edges().sort_by_distance(p)[0] for p in [
        (-62.5, 2, -17),
    ]]
    fillet(fillet8_edges, radius=FILLET8_R)


solid = part.part
